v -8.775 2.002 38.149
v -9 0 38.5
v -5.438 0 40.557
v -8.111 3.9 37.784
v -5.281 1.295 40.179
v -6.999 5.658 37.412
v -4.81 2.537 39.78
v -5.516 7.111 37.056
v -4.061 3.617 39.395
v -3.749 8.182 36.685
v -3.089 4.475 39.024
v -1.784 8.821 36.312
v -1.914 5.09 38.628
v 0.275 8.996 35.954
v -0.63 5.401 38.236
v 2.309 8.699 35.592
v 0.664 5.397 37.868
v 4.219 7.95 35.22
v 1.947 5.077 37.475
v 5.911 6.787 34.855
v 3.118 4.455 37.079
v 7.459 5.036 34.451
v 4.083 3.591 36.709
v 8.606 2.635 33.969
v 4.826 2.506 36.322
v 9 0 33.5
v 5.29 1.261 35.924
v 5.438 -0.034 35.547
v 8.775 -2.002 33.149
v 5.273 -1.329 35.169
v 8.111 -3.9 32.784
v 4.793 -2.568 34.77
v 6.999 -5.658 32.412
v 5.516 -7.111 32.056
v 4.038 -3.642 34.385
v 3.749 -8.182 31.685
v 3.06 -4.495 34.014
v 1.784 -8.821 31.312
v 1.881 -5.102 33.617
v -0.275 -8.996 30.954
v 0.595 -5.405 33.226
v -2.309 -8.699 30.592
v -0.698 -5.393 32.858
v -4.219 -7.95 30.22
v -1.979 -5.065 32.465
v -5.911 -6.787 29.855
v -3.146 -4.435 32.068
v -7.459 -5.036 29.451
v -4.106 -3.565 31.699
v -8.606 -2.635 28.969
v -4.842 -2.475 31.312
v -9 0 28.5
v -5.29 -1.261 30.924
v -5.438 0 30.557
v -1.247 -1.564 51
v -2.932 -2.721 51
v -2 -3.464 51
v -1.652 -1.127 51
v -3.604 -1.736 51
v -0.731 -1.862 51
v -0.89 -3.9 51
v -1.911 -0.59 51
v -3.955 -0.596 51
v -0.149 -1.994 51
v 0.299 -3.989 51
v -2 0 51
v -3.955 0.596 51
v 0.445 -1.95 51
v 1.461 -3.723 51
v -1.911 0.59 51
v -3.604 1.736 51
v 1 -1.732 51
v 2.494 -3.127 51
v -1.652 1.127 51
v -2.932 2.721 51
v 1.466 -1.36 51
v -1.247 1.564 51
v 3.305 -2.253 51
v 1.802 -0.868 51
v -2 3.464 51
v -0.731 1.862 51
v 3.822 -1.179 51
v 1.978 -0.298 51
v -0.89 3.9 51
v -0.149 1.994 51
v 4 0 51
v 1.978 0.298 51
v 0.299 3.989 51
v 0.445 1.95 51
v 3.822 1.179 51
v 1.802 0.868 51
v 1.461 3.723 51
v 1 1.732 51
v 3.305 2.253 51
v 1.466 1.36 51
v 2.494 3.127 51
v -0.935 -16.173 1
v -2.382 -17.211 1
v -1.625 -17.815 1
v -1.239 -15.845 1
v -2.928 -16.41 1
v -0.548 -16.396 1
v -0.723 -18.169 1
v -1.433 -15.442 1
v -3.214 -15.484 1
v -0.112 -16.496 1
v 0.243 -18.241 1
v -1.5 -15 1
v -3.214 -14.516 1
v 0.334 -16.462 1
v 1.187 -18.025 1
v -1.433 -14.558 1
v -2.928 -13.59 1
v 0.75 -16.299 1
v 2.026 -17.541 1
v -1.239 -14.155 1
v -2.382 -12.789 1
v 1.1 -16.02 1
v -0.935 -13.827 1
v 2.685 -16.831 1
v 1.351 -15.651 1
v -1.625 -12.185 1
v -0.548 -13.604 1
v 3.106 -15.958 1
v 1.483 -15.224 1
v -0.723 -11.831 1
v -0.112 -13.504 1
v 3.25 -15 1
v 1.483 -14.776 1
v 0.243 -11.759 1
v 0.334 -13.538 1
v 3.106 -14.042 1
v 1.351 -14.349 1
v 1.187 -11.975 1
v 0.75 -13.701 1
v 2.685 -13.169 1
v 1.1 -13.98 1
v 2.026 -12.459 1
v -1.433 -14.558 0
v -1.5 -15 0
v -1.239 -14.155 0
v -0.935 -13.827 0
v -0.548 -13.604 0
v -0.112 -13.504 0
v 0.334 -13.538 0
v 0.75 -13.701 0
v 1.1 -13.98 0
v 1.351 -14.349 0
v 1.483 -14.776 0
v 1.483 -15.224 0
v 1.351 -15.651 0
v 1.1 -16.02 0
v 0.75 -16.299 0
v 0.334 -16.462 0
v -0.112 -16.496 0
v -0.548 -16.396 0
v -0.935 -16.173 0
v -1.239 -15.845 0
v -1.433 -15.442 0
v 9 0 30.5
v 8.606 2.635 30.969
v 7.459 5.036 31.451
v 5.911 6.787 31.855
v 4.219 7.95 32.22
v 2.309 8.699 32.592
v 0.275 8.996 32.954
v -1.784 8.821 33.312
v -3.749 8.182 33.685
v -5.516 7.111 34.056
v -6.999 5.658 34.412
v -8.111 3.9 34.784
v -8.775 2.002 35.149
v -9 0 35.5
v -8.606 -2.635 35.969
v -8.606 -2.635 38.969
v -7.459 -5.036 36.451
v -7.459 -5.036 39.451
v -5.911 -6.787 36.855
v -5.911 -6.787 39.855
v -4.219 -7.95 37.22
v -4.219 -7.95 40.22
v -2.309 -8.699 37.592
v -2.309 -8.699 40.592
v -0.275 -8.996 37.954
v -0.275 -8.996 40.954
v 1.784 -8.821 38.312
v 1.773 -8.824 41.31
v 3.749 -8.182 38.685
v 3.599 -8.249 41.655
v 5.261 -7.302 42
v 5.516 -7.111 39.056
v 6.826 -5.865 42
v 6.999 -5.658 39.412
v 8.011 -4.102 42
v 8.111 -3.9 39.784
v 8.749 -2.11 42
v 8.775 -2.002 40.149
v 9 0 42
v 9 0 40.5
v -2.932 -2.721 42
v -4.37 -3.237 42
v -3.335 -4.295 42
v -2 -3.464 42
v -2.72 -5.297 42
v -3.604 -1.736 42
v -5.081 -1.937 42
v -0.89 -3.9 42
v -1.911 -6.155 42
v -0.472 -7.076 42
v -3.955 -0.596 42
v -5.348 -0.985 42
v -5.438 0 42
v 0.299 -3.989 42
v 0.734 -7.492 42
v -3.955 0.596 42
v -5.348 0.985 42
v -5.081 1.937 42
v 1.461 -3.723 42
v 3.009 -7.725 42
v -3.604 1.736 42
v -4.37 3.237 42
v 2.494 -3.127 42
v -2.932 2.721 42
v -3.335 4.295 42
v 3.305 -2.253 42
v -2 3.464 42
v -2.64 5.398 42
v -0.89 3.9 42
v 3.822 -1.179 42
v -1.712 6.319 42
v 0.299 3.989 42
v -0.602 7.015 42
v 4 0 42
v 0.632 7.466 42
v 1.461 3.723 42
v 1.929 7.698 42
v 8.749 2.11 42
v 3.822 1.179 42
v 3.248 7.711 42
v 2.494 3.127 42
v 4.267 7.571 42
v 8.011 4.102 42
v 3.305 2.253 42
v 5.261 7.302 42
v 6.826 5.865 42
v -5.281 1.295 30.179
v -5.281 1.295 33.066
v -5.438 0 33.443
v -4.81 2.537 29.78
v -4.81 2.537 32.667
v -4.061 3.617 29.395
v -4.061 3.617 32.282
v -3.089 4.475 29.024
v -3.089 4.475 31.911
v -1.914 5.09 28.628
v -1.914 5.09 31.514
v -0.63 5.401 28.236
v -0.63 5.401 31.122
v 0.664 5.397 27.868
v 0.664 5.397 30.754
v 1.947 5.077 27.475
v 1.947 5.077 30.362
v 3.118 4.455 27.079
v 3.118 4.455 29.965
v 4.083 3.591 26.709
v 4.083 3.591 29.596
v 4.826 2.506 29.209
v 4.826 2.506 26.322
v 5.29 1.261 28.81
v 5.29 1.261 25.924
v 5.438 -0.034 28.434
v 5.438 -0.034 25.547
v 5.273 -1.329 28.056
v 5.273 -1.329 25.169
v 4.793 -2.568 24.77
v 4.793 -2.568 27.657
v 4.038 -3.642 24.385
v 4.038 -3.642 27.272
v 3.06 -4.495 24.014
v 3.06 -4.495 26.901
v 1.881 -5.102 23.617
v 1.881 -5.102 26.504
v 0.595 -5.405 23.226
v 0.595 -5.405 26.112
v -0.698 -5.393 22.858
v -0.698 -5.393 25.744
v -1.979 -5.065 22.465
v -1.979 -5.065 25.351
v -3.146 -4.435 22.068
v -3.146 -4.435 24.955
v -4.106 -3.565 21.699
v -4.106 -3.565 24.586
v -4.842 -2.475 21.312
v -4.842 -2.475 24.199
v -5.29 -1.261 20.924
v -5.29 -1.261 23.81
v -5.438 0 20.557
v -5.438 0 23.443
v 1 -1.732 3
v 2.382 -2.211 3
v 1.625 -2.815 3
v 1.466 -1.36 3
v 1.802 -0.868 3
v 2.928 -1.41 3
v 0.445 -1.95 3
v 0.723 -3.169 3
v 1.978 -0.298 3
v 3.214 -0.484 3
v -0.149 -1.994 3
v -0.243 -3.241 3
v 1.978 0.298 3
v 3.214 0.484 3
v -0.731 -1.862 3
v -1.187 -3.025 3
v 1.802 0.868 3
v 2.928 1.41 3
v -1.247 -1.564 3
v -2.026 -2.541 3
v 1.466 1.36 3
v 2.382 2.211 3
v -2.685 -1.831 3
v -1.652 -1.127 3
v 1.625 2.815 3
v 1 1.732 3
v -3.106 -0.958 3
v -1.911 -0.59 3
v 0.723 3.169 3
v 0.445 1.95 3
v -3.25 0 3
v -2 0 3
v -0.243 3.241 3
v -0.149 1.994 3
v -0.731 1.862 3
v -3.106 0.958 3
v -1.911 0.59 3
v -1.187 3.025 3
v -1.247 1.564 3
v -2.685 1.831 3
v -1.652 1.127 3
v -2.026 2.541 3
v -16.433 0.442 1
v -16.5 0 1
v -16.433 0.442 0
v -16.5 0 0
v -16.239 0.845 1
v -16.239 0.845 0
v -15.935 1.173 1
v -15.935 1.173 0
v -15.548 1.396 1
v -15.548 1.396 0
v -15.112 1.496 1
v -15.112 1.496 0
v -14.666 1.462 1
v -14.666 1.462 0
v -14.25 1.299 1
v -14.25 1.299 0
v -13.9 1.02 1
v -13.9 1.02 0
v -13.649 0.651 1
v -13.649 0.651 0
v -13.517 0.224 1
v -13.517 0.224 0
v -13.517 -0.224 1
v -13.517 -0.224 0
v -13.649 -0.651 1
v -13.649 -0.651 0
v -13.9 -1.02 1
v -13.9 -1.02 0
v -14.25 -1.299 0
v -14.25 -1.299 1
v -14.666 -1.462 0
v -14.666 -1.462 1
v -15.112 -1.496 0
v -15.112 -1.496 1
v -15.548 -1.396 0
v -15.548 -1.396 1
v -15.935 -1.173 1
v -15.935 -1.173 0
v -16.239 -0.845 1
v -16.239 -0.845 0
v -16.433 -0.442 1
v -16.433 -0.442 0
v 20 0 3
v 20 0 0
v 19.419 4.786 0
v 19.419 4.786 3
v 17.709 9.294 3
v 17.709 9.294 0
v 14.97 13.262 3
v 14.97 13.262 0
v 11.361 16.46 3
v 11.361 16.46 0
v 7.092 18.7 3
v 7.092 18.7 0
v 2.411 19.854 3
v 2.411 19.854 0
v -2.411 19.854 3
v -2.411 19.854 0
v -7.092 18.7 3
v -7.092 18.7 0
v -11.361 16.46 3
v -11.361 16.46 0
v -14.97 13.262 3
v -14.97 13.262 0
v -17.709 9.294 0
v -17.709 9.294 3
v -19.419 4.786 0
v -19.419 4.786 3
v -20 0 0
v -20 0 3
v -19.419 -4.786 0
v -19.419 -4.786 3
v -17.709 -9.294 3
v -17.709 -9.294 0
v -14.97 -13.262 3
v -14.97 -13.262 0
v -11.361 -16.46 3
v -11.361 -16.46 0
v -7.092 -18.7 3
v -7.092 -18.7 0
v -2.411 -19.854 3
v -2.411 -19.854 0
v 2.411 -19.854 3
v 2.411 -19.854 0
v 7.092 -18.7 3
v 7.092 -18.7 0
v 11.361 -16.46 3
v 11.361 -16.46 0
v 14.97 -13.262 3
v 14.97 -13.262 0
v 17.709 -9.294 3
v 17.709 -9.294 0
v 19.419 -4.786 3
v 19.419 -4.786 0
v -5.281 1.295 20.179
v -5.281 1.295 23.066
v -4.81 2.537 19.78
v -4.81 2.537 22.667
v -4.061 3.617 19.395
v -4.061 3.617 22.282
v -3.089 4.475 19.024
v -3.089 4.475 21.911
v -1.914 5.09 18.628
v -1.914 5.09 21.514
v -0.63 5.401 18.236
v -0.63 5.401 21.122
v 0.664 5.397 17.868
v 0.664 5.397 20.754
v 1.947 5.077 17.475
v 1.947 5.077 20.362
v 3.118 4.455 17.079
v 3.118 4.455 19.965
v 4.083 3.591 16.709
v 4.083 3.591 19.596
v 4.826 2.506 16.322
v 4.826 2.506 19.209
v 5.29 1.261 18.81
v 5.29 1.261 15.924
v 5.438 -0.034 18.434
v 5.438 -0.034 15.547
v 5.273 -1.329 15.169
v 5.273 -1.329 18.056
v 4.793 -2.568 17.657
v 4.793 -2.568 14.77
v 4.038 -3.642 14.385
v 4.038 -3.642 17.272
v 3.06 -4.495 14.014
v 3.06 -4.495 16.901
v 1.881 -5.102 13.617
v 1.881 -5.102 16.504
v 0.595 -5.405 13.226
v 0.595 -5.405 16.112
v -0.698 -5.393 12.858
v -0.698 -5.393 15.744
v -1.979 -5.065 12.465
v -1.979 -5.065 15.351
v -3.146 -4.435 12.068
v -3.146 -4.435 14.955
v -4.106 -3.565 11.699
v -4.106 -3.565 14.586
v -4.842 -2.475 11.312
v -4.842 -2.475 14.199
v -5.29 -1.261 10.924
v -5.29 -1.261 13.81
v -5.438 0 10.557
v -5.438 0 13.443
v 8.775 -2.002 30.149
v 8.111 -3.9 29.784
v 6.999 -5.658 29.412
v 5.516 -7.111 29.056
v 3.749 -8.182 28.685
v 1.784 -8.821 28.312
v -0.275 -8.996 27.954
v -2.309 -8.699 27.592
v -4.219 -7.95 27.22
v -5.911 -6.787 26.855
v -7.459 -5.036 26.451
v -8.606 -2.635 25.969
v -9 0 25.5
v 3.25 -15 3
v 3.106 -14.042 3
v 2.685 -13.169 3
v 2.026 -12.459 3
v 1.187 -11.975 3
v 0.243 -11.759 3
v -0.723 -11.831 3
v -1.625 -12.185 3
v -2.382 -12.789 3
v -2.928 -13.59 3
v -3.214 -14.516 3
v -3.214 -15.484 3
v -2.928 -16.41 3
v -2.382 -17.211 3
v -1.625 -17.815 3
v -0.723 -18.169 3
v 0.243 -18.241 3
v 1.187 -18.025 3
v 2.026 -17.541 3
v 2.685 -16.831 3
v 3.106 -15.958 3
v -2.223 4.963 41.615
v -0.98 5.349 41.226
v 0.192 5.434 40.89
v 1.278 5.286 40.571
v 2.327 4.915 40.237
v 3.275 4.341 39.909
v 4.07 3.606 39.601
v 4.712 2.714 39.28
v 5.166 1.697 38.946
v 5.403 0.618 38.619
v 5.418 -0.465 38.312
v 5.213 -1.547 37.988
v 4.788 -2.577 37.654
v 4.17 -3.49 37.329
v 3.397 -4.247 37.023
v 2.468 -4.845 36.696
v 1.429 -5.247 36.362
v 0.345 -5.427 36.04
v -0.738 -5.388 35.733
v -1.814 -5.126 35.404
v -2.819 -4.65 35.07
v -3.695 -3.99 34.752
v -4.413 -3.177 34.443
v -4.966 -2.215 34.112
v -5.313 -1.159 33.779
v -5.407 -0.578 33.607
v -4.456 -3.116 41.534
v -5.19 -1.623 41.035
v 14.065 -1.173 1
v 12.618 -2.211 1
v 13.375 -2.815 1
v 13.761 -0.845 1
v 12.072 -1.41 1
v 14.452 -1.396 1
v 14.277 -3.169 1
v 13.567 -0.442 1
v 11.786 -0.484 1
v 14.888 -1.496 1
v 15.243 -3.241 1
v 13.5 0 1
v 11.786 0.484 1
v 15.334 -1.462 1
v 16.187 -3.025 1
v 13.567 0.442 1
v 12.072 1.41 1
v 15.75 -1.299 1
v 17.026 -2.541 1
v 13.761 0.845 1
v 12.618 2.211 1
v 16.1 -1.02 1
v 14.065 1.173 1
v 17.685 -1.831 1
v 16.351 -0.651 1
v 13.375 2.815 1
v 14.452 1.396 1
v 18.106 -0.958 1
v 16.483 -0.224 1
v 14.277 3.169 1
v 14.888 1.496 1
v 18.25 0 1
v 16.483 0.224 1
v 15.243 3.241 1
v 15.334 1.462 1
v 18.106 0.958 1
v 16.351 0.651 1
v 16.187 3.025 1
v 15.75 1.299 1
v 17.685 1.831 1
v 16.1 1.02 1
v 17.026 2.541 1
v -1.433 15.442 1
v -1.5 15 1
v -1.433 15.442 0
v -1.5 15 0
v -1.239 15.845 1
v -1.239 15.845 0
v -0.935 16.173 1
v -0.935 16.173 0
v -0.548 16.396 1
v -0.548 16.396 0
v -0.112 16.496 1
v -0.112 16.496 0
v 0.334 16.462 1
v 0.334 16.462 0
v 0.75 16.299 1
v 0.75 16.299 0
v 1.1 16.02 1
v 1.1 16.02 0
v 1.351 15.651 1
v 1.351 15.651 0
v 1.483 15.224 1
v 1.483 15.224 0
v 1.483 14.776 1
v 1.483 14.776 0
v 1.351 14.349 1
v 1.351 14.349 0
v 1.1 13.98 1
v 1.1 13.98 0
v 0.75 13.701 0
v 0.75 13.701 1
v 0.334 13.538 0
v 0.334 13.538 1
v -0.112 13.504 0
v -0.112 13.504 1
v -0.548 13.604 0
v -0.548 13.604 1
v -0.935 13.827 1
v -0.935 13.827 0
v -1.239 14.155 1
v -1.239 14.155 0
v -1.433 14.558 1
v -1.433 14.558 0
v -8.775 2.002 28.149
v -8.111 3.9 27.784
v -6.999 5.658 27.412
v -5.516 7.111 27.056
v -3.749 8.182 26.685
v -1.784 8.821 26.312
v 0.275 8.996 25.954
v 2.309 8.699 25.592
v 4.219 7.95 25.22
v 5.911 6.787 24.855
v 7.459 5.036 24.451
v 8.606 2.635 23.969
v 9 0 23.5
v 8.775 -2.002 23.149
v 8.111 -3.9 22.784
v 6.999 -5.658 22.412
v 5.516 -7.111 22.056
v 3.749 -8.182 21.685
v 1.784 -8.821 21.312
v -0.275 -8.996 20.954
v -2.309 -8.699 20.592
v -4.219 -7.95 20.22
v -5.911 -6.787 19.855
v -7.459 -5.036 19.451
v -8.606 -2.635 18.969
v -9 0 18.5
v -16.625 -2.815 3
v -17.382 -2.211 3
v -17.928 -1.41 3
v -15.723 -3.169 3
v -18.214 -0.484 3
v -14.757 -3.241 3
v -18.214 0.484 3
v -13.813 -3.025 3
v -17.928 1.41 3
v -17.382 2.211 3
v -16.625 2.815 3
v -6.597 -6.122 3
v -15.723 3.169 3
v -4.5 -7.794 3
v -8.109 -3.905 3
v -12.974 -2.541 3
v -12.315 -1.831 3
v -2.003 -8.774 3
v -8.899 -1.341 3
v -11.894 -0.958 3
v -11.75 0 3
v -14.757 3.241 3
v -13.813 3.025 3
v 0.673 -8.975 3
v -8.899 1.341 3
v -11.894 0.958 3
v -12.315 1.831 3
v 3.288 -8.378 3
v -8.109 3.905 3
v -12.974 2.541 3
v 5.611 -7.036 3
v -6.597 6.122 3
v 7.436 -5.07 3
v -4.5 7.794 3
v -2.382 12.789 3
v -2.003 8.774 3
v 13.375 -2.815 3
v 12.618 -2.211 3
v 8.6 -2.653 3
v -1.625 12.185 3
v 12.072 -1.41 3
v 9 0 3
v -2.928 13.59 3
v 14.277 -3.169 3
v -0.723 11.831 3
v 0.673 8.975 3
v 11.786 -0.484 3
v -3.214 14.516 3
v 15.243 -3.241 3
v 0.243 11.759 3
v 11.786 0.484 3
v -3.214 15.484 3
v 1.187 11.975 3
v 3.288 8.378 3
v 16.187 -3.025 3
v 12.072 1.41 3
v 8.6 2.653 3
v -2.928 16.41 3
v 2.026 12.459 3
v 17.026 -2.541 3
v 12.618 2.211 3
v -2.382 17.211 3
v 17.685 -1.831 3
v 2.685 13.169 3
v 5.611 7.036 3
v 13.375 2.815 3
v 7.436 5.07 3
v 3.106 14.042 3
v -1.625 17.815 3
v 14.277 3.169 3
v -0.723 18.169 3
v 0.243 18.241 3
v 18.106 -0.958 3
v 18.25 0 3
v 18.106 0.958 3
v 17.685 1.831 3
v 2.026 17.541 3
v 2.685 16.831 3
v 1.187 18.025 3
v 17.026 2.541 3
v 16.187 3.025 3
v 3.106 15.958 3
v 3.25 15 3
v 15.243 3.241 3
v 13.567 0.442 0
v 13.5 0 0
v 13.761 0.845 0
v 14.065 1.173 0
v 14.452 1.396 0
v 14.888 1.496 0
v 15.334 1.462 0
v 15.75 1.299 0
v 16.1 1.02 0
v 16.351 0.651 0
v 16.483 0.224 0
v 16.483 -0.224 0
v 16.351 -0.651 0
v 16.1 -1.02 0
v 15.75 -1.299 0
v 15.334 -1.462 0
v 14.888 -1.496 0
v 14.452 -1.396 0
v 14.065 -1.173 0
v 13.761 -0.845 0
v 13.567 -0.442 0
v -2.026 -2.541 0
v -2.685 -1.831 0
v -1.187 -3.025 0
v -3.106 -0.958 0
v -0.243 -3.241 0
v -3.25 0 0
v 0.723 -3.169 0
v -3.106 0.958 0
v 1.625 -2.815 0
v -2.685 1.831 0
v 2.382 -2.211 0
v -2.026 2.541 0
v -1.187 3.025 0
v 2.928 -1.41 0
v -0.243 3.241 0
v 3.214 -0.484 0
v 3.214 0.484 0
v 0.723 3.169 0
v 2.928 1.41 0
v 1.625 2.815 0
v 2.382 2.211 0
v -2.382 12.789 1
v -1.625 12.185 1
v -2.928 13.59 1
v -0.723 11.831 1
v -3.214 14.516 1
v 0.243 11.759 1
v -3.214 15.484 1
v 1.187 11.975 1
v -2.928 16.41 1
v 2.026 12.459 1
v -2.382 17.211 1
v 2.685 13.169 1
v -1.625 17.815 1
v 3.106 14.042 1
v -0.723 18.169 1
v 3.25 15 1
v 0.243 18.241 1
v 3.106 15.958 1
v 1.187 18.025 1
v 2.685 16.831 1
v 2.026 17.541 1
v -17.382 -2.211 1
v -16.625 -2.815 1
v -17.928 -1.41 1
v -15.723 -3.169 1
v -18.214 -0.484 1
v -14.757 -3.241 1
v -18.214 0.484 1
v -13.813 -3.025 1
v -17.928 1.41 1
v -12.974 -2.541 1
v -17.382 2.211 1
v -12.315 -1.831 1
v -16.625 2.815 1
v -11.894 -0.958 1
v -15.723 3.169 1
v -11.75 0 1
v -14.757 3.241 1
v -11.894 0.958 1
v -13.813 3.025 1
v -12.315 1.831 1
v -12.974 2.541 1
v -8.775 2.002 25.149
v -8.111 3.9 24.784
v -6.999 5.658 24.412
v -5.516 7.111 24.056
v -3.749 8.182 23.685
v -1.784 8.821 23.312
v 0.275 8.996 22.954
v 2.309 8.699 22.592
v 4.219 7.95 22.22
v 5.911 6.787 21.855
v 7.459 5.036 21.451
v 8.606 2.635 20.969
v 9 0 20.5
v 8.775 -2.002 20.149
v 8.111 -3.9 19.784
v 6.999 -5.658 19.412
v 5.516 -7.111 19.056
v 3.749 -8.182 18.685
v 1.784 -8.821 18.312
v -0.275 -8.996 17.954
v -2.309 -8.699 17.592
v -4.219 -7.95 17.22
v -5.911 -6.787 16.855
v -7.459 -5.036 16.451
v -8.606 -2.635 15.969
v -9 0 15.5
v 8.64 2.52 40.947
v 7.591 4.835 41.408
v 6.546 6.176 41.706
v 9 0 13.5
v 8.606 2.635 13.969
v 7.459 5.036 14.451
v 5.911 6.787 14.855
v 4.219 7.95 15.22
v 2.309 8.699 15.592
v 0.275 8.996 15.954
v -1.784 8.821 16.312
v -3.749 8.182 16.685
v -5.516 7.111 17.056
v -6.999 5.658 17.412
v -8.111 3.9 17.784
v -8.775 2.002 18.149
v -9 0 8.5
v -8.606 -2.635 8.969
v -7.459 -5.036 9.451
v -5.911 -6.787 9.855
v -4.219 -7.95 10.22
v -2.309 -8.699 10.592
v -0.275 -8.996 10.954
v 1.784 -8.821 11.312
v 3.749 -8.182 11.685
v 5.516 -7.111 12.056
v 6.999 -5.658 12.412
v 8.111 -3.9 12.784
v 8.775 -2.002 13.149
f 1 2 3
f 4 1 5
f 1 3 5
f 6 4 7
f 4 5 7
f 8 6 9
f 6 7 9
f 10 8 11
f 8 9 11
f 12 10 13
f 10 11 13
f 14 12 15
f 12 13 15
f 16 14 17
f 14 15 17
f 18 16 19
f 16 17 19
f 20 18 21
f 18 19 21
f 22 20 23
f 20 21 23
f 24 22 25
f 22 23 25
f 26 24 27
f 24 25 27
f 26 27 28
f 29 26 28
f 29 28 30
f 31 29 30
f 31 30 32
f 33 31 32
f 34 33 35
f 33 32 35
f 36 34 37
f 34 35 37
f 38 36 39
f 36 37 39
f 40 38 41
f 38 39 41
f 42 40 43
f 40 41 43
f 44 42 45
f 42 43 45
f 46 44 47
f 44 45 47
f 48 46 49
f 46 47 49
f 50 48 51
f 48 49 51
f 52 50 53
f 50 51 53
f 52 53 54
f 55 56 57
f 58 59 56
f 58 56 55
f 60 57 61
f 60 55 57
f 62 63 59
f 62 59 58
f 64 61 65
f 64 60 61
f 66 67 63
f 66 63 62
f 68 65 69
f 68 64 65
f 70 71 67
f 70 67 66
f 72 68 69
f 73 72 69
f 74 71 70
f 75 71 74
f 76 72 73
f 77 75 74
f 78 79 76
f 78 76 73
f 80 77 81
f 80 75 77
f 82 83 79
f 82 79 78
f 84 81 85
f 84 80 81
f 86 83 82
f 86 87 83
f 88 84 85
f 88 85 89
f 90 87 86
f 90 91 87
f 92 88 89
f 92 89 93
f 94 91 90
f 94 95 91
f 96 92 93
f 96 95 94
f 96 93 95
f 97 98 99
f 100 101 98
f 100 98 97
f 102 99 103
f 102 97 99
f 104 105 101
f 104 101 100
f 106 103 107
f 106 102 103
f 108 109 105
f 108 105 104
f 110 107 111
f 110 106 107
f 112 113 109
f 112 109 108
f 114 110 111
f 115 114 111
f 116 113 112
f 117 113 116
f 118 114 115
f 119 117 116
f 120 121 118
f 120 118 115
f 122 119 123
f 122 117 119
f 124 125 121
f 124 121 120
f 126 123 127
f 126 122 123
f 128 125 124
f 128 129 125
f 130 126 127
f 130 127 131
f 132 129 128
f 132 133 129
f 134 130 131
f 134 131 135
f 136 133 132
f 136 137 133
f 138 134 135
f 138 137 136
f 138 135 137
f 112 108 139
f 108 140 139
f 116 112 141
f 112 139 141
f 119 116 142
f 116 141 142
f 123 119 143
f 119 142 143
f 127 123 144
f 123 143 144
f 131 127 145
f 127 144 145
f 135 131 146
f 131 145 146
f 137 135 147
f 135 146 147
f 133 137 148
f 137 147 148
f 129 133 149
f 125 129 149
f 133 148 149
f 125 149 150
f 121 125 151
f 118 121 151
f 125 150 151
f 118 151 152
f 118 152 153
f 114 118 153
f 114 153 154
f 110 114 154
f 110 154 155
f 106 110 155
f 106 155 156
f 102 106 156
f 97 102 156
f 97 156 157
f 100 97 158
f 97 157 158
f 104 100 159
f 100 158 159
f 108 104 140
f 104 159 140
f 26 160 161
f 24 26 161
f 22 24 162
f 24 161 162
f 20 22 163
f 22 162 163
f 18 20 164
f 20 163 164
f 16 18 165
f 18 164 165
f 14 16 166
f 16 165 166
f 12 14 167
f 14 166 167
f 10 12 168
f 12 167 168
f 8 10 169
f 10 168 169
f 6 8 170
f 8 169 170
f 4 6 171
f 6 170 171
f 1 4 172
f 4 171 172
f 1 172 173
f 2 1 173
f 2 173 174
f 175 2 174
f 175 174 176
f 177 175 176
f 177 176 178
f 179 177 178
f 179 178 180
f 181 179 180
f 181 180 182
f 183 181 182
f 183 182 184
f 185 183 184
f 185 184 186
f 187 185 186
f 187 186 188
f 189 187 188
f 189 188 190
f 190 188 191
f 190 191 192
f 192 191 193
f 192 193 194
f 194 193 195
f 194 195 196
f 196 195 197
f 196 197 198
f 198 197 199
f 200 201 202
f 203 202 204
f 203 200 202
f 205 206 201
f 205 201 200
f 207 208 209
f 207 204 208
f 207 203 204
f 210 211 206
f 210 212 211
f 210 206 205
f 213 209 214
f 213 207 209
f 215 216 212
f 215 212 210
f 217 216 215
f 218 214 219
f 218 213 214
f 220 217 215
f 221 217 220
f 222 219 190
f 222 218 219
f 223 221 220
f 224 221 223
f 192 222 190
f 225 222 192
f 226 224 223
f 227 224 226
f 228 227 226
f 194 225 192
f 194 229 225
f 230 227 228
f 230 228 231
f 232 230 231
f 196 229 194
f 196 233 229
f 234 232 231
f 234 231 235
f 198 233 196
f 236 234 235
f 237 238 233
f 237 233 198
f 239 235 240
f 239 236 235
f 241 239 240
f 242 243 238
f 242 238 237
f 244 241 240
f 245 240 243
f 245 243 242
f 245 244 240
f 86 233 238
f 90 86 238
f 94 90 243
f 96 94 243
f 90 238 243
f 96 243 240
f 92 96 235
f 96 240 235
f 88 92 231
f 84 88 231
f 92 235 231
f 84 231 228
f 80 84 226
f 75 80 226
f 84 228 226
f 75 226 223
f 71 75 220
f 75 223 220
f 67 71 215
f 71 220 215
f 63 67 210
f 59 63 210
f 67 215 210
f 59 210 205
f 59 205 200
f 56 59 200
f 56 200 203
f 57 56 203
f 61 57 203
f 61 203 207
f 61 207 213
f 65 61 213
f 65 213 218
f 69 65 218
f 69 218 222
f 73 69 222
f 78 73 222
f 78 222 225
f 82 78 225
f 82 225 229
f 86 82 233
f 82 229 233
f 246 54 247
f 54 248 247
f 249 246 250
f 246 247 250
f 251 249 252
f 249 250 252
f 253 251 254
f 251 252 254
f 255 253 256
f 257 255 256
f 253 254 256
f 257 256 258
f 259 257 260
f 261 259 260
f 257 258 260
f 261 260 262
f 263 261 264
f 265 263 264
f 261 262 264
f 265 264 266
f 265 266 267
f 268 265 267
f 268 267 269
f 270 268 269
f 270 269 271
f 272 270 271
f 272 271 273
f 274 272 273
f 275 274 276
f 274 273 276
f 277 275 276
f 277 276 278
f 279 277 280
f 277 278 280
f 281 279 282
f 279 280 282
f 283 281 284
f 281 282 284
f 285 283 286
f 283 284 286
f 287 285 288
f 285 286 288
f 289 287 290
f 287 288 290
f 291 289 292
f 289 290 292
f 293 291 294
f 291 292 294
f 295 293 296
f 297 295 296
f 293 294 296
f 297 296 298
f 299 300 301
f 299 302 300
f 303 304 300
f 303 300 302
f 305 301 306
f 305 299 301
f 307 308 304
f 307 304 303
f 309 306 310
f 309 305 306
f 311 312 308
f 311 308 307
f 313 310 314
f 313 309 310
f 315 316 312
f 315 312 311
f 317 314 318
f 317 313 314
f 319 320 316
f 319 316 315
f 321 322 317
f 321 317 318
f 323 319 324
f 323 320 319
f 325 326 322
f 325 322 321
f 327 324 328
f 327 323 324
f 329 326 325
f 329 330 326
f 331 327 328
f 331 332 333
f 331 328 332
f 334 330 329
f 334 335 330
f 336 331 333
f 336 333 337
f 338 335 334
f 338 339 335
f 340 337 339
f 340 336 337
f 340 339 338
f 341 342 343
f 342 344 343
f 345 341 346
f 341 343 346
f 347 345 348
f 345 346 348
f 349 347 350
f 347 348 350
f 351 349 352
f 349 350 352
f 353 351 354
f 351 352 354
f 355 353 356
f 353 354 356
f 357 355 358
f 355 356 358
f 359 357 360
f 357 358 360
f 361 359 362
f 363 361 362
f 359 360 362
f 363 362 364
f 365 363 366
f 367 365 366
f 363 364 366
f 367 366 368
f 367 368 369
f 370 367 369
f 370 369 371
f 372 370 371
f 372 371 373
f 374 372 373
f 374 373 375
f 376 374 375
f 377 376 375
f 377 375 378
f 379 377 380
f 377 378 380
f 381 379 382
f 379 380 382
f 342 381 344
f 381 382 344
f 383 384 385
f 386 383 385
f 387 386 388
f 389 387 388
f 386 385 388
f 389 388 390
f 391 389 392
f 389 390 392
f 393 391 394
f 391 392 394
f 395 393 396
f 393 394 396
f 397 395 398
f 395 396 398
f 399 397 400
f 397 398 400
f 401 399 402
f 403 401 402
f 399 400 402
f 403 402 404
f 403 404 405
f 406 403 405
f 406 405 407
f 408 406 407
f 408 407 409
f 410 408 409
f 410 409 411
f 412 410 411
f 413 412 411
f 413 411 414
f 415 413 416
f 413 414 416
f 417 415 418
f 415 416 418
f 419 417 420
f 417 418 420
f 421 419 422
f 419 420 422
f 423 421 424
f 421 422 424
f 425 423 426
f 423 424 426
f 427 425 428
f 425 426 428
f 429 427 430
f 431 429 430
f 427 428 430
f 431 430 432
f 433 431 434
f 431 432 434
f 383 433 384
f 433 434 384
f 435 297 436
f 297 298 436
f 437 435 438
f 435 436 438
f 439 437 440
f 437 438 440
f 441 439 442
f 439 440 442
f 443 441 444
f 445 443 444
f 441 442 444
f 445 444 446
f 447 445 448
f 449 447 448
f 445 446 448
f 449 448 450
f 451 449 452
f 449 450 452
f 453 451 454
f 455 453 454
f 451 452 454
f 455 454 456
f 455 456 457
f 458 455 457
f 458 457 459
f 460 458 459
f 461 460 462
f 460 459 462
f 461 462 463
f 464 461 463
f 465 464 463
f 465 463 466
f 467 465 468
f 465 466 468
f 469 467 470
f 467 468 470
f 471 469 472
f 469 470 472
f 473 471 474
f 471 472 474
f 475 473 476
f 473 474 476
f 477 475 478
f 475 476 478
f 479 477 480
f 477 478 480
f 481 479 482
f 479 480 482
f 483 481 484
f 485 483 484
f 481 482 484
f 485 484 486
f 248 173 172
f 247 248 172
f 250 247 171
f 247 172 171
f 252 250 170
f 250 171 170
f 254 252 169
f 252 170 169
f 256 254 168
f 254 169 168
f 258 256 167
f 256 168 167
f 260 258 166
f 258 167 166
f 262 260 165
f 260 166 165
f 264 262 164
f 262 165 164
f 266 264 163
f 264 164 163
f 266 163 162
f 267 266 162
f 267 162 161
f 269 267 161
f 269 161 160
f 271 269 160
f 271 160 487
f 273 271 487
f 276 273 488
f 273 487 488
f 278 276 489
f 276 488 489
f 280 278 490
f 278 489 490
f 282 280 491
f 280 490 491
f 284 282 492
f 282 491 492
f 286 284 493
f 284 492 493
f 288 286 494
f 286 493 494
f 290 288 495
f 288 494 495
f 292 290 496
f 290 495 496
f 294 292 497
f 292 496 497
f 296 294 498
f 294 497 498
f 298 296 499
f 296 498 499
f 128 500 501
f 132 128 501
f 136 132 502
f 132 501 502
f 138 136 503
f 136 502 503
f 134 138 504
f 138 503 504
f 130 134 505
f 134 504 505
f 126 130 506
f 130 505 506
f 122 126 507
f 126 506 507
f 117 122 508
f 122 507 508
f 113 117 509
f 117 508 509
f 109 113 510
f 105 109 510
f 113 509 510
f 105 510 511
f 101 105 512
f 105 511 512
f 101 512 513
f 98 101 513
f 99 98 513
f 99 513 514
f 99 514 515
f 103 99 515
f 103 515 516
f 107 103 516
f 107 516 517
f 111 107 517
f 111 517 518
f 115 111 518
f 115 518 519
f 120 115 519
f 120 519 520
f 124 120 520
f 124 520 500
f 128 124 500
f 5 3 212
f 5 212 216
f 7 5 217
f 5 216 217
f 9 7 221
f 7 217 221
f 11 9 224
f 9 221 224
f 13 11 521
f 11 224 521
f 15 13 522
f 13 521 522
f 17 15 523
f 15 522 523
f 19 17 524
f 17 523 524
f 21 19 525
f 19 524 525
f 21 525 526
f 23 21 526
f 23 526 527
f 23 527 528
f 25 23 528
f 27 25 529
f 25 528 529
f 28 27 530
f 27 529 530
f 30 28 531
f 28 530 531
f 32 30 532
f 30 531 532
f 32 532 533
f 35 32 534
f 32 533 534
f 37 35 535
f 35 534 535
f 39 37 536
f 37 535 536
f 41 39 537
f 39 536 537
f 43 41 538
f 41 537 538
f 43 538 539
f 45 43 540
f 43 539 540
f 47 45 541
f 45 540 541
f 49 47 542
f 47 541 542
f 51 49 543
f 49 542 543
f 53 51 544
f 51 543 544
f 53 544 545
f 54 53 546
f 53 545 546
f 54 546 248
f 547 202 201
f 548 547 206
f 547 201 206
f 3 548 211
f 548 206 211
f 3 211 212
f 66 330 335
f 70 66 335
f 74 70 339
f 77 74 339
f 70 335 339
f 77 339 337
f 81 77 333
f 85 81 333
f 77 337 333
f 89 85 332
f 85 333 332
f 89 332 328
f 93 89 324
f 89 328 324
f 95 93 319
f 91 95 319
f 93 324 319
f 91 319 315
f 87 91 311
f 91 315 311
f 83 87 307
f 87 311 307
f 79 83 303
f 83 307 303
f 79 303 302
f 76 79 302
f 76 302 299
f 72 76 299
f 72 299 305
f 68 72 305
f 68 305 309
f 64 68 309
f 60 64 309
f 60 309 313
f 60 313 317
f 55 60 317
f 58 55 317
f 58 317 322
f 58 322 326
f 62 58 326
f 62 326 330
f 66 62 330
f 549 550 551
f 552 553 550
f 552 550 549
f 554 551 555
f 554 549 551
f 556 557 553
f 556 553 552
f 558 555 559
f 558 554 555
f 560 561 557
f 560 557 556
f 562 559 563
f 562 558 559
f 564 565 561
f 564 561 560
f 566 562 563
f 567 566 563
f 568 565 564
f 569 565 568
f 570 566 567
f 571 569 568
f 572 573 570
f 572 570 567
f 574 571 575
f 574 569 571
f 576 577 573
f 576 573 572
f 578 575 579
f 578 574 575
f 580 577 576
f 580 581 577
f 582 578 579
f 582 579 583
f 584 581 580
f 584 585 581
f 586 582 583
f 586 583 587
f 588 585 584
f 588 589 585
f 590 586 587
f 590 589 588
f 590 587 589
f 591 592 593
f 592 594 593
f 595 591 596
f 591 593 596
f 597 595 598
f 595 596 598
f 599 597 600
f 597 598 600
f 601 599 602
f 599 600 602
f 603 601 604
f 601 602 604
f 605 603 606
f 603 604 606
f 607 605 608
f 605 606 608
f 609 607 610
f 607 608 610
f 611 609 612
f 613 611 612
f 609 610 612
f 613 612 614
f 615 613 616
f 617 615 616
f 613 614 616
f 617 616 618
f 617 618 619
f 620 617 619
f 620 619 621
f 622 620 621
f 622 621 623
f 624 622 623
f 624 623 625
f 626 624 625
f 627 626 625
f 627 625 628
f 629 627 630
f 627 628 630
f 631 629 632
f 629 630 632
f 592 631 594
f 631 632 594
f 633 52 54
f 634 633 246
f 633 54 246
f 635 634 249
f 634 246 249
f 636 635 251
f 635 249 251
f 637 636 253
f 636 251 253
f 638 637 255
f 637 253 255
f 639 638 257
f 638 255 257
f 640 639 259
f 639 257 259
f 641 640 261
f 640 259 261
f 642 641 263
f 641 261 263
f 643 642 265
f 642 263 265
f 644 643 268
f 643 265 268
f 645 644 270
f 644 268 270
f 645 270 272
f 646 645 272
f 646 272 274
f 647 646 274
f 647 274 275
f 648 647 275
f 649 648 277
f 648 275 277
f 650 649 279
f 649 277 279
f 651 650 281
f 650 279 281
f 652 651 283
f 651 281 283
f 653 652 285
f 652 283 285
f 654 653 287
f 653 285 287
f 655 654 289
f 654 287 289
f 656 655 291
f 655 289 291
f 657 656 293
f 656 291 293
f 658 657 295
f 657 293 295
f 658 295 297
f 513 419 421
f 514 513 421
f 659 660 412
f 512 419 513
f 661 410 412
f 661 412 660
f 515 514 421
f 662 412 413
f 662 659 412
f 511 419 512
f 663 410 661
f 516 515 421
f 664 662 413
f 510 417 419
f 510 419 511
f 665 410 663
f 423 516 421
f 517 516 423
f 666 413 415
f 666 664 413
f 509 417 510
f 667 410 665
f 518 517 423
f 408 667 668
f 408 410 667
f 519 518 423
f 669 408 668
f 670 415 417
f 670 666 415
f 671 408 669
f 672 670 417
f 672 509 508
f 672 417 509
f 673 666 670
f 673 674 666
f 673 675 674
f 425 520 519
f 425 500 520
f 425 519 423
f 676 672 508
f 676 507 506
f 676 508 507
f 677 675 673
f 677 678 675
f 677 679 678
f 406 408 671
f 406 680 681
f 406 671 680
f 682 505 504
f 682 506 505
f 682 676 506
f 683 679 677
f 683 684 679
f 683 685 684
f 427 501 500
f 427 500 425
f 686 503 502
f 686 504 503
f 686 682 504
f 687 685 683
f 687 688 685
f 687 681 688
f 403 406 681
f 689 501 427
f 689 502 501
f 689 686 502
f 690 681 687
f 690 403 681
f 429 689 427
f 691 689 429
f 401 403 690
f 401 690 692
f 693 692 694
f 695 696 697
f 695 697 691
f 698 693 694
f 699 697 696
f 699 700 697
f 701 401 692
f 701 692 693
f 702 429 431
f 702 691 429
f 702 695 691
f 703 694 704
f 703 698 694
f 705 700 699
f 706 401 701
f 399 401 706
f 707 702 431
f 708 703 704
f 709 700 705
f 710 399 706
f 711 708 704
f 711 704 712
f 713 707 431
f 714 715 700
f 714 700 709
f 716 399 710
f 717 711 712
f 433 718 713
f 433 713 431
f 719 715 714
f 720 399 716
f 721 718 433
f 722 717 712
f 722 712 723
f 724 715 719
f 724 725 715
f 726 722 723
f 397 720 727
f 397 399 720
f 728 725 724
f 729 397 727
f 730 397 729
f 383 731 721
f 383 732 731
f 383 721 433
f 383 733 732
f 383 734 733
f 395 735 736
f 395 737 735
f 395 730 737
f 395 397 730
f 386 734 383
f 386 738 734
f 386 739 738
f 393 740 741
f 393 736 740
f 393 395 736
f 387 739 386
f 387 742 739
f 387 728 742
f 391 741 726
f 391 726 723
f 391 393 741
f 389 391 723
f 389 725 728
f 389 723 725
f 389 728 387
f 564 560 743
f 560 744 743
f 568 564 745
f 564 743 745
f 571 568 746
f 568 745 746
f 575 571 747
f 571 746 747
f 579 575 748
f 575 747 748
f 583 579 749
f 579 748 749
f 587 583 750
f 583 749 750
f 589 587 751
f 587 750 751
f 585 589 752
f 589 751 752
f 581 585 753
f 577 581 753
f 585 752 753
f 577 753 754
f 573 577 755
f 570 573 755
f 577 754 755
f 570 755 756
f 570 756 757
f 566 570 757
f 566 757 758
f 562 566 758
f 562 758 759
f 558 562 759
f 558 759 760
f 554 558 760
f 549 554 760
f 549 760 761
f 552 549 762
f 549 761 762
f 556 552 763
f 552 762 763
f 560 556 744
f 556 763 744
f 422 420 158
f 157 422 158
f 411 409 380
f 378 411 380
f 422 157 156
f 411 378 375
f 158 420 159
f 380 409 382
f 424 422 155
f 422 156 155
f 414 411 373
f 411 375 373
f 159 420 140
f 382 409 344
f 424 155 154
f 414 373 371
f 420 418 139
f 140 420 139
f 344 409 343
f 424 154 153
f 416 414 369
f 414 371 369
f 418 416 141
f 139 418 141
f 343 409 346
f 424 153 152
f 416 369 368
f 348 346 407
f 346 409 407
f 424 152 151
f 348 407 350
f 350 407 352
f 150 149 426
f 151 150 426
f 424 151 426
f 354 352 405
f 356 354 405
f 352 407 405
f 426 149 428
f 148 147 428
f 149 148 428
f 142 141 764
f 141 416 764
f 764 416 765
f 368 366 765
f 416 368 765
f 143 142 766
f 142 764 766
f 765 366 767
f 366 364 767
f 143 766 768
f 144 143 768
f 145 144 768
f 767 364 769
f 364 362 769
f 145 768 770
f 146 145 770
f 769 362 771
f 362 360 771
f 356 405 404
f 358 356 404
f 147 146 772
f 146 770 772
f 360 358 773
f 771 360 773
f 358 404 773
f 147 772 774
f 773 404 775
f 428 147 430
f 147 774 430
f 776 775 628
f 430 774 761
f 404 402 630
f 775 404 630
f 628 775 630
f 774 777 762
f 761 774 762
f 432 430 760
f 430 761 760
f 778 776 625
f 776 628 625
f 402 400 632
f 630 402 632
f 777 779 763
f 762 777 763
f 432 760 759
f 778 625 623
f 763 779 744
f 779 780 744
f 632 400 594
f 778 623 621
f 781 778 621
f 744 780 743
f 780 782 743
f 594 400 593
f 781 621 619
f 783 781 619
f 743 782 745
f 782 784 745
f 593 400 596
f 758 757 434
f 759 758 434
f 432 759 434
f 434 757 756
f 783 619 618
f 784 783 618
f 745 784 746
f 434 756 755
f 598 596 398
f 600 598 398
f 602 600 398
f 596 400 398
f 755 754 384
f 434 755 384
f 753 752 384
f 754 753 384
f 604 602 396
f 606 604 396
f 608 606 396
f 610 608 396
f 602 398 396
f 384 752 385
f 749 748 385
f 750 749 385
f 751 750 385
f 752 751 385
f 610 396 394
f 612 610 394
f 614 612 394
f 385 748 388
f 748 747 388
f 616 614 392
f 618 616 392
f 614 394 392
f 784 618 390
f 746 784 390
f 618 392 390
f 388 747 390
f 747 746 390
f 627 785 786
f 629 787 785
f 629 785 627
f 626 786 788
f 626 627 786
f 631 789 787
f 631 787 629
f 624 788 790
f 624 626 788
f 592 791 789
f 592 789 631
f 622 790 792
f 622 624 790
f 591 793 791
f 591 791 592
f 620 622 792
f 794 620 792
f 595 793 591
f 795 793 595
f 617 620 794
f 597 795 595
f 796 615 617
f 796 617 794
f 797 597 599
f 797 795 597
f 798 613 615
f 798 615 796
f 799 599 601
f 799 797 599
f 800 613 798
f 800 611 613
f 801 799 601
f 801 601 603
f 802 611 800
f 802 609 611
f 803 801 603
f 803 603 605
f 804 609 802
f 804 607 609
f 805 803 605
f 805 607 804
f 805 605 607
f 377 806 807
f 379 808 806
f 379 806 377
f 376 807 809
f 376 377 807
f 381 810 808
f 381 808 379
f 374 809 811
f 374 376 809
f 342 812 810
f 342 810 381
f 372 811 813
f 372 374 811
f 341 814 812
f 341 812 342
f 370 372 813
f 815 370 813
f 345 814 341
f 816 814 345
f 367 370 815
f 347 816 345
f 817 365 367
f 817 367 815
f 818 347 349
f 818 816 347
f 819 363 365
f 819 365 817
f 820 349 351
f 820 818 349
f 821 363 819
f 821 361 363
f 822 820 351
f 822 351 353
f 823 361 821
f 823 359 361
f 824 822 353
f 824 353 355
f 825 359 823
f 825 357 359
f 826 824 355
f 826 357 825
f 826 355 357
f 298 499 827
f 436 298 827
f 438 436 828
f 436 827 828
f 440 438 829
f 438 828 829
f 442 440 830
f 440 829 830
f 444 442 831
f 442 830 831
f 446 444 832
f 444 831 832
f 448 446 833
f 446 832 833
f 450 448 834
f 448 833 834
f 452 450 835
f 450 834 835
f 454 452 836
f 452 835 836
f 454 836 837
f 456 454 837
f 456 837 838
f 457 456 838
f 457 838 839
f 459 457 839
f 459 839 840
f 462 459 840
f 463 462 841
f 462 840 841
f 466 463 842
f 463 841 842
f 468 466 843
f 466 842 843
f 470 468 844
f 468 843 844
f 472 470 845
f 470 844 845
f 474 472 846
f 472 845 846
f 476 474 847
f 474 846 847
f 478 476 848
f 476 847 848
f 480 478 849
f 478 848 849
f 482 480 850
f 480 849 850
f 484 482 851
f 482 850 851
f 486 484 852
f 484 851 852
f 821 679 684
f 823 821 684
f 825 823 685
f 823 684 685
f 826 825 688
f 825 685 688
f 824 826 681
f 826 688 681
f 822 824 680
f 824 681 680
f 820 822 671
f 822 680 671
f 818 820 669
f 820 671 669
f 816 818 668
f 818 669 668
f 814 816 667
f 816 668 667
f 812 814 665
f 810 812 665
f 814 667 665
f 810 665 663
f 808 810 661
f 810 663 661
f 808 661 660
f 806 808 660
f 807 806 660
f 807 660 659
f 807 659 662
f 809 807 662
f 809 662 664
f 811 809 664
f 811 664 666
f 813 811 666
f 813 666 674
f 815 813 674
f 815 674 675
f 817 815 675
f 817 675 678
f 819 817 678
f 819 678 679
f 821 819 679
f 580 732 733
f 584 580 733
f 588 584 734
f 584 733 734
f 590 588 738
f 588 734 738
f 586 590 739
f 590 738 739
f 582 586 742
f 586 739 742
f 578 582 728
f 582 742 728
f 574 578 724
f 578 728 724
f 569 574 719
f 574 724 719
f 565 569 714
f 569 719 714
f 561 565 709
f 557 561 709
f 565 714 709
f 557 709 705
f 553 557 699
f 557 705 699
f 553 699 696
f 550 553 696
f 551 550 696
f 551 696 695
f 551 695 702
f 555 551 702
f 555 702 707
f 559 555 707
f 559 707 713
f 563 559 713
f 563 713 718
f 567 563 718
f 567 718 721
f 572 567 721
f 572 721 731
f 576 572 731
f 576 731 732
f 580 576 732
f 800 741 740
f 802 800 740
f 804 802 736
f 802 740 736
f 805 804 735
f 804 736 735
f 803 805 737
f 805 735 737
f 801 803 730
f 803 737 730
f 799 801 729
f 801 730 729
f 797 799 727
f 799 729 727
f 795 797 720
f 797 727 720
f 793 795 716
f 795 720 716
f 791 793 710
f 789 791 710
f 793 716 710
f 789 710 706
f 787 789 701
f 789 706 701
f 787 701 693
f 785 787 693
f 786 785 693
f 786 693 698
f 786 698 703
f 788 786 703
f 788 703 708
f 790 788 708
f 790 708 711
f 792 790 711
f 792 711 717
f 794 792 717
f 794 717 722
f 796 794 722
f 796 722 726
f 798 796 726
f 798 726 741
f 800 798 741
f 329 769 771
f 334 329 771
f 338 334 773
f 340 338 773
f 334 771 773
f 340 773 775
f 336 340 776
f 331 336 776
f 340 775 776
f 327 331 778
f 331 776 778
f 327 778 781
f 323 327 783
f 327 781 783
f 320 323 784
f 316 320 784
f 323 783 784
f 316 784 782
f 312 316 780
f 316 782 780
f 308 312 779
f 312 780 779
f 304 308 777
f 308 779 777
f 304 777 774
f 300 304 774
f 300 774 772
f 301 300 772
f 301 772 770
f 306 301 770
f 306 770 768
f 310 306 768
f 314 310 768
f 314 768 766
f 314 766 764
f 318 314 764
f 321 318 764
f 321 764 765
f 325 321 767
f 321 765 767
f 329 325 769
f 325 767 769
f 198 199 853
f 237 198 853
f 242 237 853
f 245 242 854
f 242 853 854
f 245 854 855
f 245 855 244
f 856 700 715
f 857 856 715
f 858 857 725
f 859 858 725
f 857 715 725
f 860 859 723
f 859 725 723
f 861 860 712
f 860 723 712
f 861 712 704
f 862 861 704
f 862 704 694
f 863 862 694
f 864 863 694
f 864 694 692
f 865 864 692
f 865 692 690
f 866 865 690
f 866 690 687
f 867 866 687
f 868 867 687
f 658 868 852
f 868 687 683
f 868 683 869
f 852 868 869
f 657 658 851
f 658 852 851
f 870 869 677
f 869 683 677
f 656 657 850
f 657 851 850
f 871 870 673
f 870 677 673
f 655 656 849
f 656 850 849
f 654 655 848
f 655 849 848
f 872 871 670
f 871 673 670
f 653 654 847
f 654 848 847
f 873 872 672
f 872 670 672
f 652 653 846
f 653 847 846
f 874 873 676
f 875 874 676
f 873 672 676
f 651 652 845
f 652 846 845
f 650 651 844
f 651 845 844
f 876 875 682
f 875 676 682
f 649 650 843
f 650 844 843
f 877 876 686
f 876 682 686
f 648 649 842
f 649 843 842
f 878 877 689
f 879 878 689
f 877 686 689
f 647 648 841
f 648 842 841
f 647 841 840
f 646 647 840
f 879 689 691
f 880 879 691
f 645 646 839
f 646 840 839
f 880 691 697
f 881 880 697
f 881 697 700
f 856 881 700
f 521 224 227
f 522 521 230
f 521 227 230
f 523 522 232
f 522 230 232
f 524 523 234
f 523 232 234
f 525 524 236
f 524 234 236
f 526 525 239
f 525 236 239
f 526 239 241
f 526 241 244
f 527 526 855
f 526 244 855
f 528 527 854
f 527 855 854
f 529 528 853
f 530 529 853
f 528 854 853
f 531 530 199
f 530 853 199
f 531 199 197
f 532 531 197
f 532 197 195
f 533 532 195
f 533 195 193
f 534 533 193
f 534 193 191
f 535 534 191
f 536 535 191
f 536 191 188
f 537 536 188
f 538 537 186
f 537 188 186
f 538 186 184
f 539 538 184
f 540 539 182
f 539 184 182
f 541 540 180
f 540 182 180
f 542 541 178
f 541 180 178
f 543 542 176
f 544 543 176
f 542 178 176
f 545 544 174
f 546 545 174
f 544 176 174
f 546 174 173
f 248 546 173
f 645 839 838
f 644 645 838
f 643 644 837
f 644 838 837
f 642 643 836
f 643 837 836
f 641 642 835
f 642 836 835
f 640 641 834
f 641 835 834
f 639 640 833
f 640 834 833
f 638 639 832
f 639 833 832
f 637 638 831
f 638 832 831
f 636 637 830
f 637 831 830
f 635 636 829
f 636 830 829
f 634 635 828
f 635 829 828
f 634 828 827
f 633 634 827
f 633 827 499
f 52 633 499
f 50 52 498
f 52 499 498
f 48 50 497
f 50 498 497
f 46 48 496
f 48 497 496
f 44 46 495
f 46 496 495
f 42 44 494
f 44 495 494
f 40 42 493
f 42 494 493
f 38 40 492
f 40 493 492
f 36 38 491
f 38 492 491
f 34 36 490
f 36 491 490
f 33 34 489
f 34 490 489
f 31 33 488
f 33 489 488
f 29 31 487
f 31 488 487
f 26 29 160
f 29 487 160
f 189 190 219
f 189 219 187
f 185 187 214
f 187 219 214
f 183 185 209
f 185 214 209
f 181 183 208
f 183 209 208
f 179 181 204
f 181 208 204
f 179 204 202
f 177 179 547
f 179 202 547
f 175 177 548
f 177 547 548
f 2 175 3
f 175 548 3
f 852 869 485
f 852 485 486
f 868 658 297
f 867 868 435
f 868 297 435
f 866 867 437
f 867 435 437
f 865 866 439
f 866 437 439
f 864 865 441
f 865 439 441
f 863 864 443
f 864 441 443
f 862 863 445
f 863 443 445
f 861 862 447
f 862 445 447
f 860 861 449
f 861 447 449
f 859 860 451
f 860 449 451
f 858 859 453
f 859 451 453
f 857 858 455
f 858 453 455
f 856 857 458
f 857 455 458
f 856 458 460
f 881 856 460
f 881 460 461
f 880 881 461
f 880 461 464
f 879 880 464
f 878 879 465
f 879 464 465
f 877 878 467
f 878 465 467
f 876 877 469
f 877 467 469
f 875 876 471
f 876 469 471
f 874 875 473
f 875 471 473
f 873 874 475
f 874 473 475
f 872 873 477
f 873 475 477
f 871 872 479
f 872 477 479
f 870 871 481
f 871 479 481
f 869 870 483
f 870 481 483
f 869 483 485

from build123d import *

# Parameters (mm, degrees)
SKETCH1_R                                        = 20
EXTRUDE1_DEPTH                                   = 3
SKETCH2_R                                        = 9
EXTRUDE2_DEPTH                                   = 6
SKETCH3_R                                        = 9
EXTRUDE3_DEPTH                                   = 33
CUT_SWEEP1_PITCH                                 = 10
SKETCH6_R                                        = 4
EXTRUDE4_DEPTH                                   = 9
CBORE_FOR_M3_PAN_HEAD_MACHINE_SCREW1_D           = 3
CBORE_FOR_M3_PAN_HEAD_MACHINE_SCREW1_CBORE_D     = 6.5
CBORE_FOR_M3_PAN_HEAD_MACHINE_SCREW1_CBORE_DEPTH = 2
SKETCH8_R                                        = 2
EXTRUDE5_DEPTH                                   = 59.318093247
SKETCH9_R                                        = 3.25
EXTRUDE6_DEPTH                                   = 3


with BuildPart() as part:
    # Sketch1 → Extrude1 (new body)
    with BuildSketch(Plane.XY):
        Circle(SKETCH1_R)
    extrude(amount=EXTRUDE1_DEPTH)

    # Sketch2 → Extrude2 (add)
    with BuildSketch(Plane.XY.offset(3)):
        Circle(SKETCH2_R)
    extrude(amount=EXTRUDE2_DEPTH)

    # Sketch3 → Extrude3 (add)
    with BuildSketch(Plane.XY.offset(9)):
        Circle(SKETCH3_R)
    extrude(amount=EXTRUDE3_DEPTH)

    # Cut-Sweep1: arcs per turn and ends read off the stored shape
    # Cut-Sweep1: the profile of Sketch5 screwed along a right-hand helix through 4 turns, 8 arcs to a turn; built about Z, then put on its axis
    cut_sweep1_z = Axis((0, 0, 0), (0, 0, 1))
    cut_sweep1_corners = [(5.437822174, 0, -8.556624327), (5.437822174, 0, -11.443375673), (12.031088913, 0, -15.25), (12.031088913, 0, -4.75)]
    with BuildLine(mode=Mode.PRIVATE) as cut_sweep1_profile:
        Line(cut_sweep1_corners[0], cut_sweep1_corners[1])
        Line(cut_sweep1_corners[1], cut_sweep1_corners[2])
        Line(cut_sweep1_corners[2], cut_sweep1_corners[3])
        Line(cut_sweep1_corners[3], cut_sweep1_corners[0])
    cut_sweep1_cap = Face(cut_sweep1_profile.wire())
    cut_sweep1_turn_angles = [0, 22.5, 45, 67.5, 90, 112.5, 135, 157.5, 180, 202.5, 225, 247.5, 270, 292.5, 315, 337.5, 360]
    cut_sweep1_turn_weights = [1, 0.9238795325112867, 1, 0.9238795325112867, 1, 0.9238795325112867, 1, 0.9238795325112867, 1, 0.9238795325112867, 1, 0.9238795325112867, 1, 0.9238795325112867, 1, 0.9238795325112867, 1]
    cut_sweep1_turn_rails = [Edge.make_bspline([Vector(p[0], p[1], 0).rotate(cut_sweep1_z, cut_sweep1_turn_angles[k]) / cut_sweep1_turn_weights[k] + Vector(0, 0, p[2] + CUT_SWEEP1_PITCH * cut_sweep1_turn_angles[k] / 360) for k in range(17)], [0, 0, 0, 1, 1, 2, 2, 3, 3, 4, 4, 5, 5, 6, 6, 7, 7, 8, 8, 8], 2, cut_sweep1_turn_weights) for p in cut_sweep1_corners]
    cut_sweep1_turn_sides = [Face.make_surface_from_curves(cut_sweep1_turn_rails[p[0]], cut_sweep1_turn_rails[p[1]]) for p in [(0, 1), (1, 2), (2, 3), (3, 0)]]
    cut_sweep1 = Plane(origin=(0, 0, 42), x_dir=(-1, 0, 0), z_dir=(0, 0, -1)) * Solid(Shell([*[p.moved(Location((0, 0, CUT_SWEEP1_PITCH * i))) for i in range(4) for p in cut_sweep1_turn_sides], cut_sweep1_cap, cut_sweep1_cap.rotate(cut_sweep1_z, 1440).moved(Location((0, 0, CUT_SWEEP1_PITCH * 1440 / 360)))]))
    add(cut_sweep1, mode=Mode.SUBTRACT)

    # Sketch6 → Extrude4 (add)
    with BuildSketch(Plane.XY.offset(42)):
        Circle(SKETCH6_R)
    extrude(amount=EXTRUDE4_DEPTH)

    # CBORE for M3 Pan Head Machine Screw1 (through all)
    with Locations(Plane(origin=(15, 0, 3), x_dir=(1, 0, 0), z_dir=(0, 0, 1))):
        with Locations((0, 0), (-15, -15), (-30, 0), (-15, 15)):
            CounterBoreHole(CBORE_FOR_M3_PAN_HEAD_MACHINE_SCREW1_D / 2, CBORE_FOR_M3_PAN_HEAD_MACHINE_SCREW1_CBORE_D / 2, CBORE_FOR_M3_PAN_HEAD_MACHINE_SCREW1_CBORE_DEPTH)

    # Sketch8 → Extrude5 (cut, through all)
    with BuildSketch(Plane(origin=(0, 0, 0), x_dir=(-1, 0, 0), z_dir=(0, 0, -1))):
        Circle(SKETCH8_R)
    extrude(amount=-EXTRUDE5_DEPTH, mode=Mode.SUBTRACT)

    # Sketch9 → Extrude6 (cut)
    with BuildSketch(Plane(origin=(0, 0, 0), x_dir=(-1, 0, 0), z_dir=(0, 0, -1))):
        Circle(SKETCH9_R)
    extrude(amount=-EXTRUDE6_DEPTH, mode=Mode.SUBTRACT)


solid = part.part
